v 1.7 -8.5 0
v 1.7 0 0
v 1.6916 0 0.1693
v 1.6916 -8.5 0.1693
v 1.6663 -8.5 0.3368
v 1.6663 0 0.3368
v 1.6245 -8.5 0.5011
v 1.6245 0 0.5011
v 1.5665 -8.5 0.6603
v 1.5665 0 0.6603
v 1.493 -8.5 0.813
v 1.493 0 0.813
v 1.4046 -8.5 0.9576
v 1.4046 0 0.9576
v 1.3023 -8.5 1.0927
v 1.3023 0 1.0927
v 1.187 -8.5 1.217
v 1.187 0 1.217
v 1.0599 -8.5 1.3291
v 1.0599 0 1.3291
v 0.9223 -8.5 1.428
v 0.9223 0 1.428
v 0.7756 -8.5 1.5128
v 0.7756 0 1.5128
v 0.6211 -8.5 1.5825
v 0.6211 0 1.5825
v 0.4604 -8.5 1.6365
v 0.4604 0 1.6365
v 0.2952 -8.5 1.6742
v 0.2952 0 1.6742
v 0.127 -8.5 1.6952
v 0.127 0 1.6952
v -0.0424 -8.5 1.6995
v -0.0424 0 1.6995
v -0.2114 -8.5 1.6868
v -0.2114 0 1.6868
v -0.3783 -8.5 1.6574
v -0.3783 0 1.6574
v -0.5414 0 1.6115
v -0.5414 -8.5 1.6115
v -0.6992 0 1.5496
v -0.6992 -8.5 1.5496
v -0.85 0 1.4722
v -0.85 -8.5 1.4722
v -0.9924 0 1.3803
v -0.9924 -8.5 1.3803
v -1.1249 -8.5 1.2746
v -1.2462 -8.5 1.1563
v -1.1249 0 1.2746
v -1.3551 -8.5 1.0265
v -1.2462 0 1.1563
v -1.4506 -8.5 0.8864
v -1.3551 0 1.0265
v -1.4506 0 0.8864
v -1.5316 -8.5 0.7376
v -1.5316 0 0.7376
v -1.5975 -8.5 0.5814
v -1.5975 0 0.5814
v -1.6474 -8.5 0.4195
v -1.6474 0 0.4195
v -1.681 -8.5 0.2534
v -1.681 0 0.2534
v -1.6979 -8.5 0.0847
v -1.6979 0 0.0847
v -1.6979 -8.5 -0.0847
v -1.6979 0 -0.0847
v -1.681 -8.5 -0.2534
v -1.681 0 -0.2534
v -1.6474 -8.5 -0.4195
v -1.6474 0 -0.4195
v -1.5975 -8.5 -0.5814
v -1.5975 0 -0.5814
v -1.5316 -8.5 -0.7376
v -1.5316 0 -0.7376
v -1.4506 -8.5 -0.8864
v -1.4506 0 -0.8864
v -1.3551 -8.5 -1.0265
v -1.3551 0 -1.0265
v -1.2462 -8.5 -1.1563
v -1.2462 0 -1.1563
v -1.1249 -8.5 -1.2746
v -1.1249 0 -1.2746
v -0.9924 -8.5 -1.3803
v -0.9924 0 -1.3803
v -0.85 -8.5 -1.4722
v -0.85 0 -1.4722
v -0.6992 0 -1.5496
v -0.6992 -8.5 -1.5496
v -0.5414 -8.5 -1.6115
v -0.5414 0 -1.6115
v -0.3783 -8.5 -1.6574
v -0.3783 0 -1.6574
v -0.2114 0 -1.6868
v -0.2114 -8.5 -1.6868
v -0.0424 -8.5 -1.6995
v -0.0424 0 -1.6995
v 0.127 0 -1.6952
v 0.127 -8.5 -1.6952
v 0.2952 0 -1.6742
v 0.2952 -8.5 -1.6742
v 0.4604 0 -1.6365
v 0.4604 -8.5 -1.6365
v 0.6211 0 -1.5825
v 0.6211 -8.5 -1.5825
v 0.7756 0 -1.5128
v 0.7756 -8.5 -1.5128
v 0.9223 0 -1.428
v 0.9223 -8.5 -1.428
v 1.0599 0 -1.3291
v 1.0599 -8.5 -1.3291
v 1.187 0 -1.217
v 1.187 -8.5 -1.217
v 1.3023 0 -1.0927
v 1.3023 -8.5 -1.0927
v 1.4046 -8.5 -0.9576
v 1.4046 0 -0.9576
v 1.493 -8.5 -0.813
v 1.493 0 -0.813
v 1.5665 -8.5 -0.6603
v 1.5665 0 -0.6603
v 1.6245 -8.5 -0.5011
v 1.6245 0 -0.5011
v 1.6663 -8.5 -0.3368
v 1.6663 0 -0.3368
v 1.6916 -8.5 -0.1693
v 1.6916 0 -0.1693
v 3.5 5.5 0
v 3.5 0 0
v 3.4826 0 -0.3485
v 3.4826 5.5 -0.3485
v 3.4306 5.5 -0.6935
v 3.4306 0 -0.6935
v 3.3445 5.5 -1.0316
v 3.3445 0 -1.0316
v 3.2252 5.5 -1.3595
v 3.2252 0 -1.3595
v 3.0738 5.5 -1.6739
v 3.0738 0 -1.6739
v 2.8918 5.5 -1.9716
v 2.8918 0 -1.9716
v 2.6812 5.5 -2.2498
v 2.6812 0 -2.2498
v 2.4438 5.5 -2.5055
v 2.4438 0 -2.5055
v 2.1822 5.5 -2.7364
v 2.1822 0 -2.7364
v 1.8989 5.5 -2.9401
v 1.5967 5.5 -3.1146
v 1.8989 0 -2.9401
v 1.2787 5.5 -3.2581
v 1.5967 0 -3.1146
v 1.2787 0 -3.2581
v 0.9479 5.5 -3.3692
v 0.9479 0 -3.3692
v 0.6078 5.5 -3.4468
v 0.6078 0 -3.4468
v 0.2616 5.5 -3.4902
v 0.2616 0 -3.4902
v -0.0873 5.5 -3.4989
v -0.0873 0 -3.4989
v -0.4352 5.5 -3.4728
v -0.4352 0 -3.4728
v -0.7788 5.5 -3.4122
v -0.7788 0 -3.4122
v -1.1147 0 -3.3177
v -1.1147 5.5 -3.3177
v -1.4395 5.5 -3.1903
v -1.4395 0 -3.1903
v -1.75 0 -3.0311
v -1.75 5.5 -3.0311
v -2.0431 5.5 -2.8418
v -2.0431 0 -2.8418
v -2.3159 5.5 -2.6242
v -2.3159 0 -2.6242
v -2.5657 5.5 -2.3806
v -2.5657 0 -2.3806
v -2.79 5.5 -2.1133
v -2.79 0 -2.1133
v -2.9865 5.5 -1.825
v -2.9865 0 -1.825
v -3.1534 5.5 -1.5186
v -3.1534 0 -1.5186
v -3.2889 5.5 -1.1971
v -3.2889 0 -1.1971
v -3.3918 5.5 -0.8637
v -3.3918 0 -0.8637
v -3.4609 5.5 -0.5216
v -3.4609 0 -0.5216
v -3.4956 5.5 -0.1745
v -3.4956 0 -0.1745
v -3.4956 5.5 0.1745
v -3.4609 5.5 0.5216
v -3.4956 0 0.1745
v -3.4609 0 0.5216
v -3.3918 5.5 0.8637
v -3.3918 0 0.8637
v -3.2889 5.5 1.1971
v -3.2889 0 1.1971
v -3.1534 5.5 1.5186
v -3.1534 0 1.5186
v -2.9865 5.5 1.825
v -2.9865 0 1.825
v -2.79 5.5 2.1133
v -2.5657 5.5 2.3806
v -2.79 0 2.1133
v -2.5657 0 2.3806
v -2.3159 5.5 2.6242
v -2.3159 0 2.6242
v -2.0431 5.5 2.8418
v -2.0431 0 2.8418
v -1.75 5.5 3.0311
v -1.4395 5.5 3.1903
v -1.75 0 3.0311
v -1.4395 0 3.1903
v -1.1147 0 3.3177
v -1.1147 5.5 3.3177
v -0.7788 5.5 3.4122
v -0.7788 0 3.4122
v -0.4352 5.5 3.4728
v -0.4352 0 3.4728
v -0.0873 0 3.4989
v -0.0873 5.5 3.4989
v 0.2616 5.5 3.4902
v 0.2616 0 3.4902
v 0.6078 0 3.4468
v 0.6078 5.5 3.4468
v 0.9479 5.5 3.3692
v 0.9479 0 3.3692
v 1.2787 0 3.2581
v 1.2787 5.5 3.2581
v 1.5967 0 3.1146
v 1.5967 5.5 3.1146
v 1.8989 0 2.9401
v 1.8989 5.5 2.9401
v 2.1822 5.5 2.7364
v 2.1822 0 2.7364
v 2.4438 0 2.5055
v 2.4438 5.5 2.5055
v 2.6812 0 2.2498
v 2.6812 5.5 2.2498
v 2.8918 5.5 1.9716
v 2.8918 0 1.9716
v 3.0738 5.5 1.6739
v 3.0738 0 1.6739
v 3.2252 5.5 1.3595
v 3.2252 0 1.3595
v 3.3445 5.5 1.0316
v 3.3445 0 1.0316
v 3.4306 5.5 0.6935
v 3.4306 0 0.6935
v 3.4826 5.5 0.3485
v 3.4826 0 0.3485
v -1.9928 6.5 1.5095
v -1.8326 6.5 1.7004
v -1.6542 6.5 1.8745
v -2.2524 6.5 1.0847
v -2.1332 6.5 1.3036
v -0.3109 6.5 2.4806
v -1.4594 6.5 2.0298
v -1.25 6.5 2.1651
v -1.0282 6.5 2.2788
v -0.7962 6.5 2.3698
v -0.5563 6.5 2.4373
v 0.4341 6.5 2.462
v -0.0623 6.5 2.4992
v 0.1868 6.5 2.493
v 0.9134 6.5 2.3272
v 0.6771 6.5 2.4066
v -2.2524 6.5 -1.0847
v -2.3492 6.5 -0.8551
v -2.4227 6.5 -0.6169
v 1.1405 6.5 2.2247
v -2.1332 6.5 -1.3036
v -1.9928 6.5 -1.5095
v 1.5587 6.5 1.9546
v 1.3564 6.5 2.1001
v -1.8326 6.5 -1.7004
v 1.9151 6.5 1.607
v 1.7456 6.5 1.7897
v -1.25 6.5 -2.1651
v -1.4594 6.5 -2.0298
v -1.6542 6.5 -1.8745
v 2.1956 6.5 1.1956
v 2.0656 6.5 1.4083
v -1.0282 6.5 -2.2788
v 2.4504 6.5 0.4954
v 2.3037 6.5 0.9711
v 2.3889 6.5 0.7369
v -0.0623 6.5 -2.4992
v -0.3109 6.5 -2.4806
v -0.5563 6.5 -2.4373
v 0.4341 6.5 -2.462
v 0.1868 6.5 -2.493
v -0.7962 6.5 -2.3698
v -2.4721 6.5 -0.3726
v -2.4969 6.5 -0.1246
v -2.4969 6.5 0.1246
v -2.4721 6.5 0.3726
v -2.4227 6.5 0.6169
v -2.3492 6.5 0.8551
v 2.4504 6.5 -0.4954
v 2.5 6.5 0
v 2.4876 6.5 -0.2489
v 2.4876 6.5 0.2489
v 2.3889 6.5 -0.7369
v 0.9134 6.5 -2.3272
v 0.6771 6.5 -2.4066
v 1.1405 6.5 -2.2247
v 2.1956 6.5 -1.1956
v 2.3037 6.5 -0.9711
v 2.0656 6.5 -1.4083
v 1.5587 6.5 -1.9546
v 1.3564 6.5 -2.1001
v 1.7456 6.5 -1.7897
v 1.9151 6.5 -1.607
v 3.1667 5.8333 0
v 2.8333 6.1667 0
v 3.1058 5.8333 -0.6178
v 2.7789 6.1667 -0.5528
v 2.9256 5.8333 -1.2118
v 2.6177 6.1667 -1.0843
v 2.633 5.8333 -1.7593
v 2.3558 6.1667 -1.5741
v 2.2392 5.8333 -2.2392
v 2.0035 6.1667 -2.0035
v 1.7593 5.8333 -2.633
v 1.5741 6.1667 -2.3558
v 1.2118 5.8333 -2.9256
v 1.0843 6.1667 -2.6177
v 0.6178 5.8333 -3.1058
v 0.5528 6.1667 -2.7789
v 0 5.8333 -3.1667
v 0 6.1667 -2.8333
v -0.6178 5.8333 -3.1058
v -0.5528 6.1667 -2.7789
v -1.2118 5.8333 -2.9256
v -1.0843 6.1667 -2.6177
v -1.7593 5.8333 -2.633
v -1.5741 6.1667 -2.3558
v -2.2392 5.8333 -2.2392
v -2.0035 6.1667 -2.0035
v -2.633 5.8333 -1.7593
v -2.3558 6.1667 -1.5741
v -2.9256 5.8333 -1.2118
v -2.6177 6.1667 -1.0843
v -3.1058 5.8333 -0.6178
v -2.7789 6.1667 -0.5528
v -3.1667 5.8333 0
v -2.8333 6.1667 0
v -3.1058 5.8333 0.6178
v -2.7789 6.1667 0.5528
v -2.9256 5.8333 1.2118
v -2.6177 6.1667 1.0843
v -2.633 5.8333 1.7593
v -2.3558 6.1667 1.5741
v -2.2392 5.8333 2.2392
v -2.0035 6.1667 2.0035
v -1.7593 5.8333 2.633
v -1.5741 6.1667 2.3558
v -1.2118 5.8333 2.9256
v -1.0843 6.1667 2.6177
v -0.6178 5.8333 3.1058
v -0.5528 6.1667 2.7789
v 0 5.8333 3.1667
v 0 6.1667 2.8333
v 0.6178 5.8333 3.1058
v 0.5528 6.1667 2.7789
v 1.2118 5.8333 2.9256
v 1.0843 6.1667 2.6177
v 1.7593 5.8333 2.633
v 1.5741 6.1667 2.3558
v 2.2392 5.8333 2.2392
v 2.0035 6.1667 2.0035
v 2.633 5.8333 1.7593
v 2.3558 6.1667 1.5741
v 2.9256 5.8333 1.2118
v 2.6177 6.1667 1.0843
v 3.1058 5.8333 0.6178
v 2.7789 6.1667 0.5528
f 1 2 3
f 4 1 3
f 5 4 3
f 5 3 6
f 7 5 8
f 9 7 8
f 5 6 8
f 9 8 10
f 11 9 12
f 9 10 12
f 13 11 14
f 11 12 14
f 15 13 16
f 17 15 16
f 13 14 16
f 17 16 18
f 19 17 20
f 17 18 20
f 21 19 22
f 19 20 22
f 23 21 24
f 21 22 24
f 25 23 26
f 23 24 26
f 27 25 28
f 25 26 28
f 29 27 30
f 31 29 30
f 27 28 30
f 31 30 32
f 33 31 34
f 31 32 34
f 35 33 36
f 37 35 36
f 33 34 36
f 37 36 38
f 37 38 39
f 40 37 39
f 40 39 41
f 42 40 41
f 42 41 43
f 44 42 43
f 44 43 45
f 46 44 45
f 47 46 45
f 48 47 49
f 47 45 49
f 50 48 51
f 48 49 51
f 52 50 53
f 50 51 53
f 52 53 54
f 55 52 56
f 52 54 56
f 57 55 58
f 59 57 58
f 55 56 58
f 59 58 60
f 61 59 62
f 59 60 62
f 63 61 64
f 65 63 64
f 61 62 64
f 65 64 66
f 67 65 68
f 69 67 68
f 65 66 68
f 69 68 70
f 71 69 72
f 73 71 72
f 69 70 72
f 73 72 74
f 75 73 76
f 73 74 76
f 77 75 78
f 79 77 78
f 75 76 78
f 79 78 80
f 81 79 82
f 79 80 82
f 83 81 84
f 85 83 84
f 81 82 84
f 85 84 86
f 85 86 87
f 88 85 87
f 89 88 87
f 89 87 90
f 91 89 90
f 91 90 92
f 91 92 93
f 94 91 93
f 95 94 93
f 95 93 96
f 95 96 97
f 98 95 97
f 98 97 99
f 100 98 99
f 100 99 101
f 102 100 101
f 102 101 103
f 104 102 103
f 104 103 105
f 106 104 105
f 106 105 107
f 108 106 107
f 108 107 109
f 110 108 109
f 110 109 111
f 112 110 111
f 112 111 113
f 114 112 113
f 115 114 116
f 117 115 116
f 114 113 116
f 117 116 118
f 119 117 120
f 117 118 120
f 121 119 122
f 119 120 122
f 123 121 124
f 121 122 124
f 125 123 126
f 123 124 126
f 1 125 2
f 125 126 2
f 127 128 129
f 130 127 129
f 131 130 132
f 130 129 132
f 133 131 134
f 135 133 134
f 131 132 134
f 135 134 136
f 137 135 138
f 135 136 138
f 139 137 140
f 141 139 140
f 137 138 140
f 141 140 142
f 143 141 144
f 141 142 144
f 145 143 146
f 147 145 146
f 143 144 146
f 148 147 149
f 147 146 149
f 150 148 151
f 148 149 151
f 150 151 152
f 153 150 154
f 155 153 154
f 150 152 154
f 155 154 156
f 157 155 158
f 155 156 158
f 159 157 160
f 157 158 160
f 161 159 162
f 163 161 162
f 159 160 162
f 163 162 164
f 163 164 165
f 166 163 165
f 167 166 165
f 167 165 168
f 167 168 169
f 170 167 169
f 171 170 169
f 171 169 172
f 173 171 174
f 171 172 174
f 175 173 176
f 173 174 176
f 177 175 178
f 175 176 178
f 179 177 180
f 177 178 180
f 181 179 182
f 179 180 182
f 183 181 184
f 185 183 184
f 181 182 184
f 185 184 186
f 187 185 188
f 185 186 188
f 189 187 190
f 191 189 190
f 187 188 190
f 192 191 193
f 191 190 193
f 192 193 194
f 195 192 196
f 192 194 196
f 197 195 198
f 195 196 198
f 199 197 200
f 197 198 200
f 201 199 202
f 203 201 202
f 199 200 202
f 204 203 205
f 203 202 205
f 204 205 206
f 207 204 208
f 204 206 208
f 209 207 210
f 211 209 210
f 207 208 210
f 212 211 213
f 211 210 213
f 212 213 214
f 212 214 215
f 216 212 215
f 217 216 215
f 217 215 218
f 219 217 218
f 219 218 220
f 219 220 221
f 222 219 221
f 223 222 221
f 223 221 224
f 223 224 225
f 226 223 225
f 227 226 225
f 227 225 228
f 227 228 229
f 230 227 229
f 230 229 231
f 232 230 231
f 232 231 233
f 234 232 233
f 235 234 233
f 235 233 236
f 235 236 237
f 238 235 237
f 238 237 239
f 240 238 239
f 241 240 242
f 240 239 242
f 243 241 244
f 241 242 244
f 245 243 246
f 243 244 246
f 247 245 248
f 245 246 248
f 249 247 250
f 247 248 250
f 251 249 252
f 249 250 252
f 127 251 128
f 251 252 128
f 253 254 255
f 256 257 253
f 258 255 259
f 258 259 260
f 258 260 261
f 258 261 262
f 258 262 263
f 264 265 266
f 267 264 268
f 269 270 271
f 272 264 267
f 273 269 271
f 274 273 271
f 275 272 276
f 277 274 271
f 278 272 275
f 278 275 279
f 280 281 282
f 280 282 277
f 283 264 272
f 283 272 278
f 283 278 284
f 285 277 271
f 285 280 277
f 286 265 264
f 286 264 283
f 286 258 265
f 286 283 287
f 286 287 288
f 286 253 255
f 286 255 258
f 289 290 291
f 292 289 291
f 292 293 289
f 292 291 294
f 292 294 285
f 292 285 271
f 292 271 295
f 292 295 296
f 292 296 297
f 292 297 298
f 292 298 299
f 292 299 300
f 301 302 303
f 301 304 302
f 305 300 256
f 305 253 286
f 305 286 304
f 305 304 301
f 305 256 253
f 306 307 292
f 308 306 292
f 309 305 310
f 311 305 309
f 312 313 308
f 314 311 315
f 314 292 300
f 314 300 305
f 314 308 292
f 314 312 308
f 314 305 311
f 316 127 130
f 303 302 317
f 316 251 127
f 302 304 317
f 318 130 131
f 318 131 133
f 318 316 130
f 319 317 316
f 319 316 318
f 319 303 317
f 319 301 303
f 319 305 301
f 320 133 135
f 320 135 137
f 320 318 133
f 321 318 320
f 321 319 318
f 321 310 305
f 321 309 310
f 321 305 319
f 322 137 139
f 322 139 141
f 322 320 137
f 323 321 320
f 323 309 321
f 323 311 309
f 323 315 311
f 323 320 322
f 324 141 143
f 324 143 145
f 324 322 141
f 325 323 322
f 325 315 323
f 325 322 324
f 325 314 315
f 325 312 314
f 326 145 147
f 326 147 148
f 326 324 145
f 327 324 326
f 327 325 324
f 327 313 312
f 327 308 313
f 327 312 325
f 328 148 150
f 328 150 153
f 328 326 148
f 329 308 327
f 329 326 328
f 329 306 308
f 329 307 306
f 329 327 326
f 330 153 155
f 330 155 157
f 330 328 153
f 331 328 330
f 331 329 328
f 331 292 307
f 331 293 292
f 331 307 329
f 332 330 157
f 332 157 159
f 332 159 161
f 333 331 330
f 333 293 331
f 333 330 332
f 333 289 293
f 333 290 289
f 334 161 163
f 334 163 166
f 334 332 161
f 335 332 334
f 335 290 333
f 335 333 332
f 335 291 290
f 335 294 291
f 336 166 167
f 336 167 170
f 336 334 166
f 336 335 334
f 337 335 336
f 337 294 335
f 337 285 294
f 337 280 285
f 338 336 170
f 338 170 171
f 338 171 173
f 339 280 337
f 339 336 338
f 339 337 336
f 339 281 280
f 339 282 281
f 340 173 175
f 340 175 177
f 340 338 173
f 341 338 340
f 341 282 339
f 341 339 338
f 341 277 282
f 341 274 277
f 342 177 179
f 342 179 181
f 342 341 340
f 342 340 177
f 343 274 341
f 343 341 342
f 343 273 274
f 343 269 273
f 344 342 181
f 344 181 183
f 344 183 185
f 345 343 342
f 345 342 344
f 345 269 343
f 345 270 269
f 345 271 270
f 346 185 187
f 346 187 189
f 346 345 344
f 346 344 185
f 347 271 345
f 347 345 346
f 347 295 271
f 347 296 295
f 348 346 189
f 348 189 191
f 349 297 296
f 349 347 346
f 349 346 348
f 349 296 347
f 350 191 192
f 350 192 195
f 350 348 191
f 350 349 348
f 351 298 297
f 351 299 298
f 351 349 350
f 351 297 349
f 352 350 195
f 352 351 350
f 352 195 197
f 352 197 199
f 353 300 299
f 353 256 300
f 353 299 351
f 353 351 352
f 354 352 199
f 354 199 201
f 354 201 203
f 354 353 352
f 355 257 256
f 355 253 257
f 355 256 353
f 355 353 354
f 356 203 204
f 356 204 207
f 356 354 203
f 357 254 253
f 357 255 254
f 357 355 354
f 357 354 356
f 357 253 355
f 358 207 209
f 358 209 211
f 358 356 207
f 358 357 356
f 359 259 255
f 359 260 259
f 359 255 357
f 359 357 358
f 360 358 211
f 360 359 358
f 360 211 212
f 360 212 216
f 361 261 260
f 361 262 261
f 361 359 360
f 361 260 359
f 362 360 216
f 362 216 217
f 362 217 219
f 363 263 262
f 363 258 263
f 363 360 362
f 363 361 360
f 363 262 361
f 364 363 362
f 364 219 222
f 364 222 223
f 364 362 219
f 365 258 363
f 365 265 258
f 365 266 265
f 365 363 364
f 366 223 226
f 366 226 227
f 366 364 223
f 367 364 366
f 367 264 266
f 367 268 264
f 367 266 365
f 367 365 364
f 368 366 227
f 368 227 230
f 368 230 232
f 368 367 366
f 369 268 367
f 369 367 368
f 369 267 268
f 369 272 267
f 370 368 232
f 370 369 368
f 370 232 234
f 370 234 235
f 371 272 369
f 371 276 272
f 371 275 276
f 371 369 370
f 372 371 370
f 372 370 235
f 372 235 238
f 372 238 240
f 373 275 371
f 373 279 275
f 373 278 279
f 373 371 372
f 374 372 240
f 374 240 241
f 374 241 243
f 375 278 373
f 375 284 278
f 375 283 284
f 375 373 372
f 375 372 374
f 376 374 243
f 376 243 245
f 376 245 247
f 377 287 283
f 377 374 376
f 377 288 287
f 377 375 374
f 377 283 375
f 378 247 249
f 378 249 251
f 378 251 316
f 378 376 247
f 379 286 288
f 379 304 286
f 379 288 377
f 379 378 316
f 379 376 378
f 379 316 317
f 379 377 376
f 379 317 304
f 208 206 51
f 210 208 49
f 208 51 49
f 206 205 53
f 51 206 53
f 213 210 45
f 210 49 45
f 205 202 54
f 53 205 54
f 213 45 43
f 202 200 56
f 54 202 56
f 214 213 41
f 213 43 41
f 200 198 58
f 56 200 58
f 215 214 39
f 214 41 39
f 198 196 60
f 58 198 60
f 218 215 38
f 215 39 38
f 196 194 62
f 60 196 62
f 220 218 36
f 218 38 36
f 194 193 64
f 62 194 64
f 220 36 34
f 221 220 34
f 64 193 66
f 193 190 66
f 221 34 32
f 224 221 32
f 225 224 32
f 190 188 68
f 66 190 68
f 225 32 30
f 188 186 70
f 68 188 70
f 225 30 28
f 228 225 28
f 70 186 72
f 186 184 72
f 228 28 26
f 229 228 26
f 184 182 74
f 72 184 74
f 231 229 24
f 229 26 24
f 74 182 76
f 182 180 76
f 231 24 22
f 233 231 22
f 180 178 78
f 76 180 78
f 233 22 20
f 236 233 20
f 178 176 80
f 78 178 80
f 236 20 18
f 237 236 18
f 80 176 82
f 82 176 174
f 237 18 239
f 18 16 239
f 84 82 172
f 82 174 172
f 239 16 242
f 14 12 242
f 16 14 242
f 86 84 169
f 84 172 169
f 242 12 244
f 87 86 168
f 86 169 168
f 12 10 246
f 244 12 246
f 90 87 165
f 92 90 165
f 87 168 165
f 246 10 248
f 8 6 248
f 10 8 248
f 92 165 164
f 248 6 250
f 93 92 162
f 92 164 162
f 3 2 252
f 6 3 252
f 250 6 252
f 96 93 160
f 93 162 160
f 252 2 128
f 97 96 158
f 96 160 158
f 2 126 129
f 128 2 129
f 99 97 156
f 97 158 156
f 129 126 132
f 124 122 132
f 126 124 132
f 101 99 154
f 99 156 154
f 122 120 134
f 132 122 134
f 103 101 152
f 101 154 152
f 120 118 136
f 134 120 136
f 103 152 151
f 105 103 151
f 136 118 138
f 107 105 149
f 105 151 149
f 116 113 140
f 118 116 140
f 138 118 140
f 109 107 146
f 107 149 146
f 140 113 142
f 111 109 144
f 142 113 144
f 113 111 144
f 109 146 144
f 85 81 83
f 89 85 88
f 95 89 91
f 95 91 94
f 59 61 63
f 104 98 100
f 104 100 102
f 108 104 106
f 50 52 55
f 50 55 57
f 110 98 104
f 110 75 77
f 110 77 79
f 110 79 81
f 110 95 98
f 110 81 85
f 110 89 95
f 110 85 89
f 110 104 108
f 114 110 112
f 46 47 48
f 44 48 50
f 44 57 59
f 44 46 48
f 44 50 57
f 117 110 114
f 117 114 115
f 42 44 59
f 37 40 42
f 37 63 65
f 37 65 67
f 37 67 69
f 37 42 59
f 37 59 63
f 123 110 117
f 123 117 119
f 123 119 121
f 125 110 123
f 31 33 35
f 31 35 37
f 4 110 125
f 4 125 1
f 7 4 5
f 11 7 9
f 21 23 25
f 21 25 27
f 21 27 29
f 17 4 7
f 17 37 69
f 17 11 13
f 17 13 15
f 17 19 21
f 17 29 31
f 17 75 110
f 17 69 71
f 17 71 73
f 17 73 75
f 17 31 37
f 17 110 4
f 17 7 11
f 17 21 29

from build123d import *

# Parameters (mm, degrees)
SKETCH1_R           = 3.5
BOSS_EXTRUDE1_DEPTH = 6.5
CHAMFER1_SIZE       = 1
SKETCH2_R           = 1.7
BOSS_EXTRUDE2_DEPTH = 8.5


with BuildPart() as part:
    # Sketch1 → Boss-Extrude1 (new body)
    with BuildSketch(Plane(origin=(0, 0, 0), x_dir=(1, 0, 0), z_dir=(0, 1, 0))):
        Circle(SKETCH1_R)
    extrude(amount=BOSS_EXTRUDE1_DEPTH)

    # Chamfer1
    chamfer1_edges = [part.edges().sort_by_distance(p)[0] for p in [
        (-3.5, 6.5, 0),
    ]]
    chamfer(chamfer1_edges, length=CHAMFER1_SIZE)

    # Sketch2 → Boss-Extrude2 (add)
    with BuildSketch(Plane.XZ):
        Circle(SKETCH2_R)
    extrude(amount=BOSS_EXTRUDE2_DEPTH)


solid = part.part
